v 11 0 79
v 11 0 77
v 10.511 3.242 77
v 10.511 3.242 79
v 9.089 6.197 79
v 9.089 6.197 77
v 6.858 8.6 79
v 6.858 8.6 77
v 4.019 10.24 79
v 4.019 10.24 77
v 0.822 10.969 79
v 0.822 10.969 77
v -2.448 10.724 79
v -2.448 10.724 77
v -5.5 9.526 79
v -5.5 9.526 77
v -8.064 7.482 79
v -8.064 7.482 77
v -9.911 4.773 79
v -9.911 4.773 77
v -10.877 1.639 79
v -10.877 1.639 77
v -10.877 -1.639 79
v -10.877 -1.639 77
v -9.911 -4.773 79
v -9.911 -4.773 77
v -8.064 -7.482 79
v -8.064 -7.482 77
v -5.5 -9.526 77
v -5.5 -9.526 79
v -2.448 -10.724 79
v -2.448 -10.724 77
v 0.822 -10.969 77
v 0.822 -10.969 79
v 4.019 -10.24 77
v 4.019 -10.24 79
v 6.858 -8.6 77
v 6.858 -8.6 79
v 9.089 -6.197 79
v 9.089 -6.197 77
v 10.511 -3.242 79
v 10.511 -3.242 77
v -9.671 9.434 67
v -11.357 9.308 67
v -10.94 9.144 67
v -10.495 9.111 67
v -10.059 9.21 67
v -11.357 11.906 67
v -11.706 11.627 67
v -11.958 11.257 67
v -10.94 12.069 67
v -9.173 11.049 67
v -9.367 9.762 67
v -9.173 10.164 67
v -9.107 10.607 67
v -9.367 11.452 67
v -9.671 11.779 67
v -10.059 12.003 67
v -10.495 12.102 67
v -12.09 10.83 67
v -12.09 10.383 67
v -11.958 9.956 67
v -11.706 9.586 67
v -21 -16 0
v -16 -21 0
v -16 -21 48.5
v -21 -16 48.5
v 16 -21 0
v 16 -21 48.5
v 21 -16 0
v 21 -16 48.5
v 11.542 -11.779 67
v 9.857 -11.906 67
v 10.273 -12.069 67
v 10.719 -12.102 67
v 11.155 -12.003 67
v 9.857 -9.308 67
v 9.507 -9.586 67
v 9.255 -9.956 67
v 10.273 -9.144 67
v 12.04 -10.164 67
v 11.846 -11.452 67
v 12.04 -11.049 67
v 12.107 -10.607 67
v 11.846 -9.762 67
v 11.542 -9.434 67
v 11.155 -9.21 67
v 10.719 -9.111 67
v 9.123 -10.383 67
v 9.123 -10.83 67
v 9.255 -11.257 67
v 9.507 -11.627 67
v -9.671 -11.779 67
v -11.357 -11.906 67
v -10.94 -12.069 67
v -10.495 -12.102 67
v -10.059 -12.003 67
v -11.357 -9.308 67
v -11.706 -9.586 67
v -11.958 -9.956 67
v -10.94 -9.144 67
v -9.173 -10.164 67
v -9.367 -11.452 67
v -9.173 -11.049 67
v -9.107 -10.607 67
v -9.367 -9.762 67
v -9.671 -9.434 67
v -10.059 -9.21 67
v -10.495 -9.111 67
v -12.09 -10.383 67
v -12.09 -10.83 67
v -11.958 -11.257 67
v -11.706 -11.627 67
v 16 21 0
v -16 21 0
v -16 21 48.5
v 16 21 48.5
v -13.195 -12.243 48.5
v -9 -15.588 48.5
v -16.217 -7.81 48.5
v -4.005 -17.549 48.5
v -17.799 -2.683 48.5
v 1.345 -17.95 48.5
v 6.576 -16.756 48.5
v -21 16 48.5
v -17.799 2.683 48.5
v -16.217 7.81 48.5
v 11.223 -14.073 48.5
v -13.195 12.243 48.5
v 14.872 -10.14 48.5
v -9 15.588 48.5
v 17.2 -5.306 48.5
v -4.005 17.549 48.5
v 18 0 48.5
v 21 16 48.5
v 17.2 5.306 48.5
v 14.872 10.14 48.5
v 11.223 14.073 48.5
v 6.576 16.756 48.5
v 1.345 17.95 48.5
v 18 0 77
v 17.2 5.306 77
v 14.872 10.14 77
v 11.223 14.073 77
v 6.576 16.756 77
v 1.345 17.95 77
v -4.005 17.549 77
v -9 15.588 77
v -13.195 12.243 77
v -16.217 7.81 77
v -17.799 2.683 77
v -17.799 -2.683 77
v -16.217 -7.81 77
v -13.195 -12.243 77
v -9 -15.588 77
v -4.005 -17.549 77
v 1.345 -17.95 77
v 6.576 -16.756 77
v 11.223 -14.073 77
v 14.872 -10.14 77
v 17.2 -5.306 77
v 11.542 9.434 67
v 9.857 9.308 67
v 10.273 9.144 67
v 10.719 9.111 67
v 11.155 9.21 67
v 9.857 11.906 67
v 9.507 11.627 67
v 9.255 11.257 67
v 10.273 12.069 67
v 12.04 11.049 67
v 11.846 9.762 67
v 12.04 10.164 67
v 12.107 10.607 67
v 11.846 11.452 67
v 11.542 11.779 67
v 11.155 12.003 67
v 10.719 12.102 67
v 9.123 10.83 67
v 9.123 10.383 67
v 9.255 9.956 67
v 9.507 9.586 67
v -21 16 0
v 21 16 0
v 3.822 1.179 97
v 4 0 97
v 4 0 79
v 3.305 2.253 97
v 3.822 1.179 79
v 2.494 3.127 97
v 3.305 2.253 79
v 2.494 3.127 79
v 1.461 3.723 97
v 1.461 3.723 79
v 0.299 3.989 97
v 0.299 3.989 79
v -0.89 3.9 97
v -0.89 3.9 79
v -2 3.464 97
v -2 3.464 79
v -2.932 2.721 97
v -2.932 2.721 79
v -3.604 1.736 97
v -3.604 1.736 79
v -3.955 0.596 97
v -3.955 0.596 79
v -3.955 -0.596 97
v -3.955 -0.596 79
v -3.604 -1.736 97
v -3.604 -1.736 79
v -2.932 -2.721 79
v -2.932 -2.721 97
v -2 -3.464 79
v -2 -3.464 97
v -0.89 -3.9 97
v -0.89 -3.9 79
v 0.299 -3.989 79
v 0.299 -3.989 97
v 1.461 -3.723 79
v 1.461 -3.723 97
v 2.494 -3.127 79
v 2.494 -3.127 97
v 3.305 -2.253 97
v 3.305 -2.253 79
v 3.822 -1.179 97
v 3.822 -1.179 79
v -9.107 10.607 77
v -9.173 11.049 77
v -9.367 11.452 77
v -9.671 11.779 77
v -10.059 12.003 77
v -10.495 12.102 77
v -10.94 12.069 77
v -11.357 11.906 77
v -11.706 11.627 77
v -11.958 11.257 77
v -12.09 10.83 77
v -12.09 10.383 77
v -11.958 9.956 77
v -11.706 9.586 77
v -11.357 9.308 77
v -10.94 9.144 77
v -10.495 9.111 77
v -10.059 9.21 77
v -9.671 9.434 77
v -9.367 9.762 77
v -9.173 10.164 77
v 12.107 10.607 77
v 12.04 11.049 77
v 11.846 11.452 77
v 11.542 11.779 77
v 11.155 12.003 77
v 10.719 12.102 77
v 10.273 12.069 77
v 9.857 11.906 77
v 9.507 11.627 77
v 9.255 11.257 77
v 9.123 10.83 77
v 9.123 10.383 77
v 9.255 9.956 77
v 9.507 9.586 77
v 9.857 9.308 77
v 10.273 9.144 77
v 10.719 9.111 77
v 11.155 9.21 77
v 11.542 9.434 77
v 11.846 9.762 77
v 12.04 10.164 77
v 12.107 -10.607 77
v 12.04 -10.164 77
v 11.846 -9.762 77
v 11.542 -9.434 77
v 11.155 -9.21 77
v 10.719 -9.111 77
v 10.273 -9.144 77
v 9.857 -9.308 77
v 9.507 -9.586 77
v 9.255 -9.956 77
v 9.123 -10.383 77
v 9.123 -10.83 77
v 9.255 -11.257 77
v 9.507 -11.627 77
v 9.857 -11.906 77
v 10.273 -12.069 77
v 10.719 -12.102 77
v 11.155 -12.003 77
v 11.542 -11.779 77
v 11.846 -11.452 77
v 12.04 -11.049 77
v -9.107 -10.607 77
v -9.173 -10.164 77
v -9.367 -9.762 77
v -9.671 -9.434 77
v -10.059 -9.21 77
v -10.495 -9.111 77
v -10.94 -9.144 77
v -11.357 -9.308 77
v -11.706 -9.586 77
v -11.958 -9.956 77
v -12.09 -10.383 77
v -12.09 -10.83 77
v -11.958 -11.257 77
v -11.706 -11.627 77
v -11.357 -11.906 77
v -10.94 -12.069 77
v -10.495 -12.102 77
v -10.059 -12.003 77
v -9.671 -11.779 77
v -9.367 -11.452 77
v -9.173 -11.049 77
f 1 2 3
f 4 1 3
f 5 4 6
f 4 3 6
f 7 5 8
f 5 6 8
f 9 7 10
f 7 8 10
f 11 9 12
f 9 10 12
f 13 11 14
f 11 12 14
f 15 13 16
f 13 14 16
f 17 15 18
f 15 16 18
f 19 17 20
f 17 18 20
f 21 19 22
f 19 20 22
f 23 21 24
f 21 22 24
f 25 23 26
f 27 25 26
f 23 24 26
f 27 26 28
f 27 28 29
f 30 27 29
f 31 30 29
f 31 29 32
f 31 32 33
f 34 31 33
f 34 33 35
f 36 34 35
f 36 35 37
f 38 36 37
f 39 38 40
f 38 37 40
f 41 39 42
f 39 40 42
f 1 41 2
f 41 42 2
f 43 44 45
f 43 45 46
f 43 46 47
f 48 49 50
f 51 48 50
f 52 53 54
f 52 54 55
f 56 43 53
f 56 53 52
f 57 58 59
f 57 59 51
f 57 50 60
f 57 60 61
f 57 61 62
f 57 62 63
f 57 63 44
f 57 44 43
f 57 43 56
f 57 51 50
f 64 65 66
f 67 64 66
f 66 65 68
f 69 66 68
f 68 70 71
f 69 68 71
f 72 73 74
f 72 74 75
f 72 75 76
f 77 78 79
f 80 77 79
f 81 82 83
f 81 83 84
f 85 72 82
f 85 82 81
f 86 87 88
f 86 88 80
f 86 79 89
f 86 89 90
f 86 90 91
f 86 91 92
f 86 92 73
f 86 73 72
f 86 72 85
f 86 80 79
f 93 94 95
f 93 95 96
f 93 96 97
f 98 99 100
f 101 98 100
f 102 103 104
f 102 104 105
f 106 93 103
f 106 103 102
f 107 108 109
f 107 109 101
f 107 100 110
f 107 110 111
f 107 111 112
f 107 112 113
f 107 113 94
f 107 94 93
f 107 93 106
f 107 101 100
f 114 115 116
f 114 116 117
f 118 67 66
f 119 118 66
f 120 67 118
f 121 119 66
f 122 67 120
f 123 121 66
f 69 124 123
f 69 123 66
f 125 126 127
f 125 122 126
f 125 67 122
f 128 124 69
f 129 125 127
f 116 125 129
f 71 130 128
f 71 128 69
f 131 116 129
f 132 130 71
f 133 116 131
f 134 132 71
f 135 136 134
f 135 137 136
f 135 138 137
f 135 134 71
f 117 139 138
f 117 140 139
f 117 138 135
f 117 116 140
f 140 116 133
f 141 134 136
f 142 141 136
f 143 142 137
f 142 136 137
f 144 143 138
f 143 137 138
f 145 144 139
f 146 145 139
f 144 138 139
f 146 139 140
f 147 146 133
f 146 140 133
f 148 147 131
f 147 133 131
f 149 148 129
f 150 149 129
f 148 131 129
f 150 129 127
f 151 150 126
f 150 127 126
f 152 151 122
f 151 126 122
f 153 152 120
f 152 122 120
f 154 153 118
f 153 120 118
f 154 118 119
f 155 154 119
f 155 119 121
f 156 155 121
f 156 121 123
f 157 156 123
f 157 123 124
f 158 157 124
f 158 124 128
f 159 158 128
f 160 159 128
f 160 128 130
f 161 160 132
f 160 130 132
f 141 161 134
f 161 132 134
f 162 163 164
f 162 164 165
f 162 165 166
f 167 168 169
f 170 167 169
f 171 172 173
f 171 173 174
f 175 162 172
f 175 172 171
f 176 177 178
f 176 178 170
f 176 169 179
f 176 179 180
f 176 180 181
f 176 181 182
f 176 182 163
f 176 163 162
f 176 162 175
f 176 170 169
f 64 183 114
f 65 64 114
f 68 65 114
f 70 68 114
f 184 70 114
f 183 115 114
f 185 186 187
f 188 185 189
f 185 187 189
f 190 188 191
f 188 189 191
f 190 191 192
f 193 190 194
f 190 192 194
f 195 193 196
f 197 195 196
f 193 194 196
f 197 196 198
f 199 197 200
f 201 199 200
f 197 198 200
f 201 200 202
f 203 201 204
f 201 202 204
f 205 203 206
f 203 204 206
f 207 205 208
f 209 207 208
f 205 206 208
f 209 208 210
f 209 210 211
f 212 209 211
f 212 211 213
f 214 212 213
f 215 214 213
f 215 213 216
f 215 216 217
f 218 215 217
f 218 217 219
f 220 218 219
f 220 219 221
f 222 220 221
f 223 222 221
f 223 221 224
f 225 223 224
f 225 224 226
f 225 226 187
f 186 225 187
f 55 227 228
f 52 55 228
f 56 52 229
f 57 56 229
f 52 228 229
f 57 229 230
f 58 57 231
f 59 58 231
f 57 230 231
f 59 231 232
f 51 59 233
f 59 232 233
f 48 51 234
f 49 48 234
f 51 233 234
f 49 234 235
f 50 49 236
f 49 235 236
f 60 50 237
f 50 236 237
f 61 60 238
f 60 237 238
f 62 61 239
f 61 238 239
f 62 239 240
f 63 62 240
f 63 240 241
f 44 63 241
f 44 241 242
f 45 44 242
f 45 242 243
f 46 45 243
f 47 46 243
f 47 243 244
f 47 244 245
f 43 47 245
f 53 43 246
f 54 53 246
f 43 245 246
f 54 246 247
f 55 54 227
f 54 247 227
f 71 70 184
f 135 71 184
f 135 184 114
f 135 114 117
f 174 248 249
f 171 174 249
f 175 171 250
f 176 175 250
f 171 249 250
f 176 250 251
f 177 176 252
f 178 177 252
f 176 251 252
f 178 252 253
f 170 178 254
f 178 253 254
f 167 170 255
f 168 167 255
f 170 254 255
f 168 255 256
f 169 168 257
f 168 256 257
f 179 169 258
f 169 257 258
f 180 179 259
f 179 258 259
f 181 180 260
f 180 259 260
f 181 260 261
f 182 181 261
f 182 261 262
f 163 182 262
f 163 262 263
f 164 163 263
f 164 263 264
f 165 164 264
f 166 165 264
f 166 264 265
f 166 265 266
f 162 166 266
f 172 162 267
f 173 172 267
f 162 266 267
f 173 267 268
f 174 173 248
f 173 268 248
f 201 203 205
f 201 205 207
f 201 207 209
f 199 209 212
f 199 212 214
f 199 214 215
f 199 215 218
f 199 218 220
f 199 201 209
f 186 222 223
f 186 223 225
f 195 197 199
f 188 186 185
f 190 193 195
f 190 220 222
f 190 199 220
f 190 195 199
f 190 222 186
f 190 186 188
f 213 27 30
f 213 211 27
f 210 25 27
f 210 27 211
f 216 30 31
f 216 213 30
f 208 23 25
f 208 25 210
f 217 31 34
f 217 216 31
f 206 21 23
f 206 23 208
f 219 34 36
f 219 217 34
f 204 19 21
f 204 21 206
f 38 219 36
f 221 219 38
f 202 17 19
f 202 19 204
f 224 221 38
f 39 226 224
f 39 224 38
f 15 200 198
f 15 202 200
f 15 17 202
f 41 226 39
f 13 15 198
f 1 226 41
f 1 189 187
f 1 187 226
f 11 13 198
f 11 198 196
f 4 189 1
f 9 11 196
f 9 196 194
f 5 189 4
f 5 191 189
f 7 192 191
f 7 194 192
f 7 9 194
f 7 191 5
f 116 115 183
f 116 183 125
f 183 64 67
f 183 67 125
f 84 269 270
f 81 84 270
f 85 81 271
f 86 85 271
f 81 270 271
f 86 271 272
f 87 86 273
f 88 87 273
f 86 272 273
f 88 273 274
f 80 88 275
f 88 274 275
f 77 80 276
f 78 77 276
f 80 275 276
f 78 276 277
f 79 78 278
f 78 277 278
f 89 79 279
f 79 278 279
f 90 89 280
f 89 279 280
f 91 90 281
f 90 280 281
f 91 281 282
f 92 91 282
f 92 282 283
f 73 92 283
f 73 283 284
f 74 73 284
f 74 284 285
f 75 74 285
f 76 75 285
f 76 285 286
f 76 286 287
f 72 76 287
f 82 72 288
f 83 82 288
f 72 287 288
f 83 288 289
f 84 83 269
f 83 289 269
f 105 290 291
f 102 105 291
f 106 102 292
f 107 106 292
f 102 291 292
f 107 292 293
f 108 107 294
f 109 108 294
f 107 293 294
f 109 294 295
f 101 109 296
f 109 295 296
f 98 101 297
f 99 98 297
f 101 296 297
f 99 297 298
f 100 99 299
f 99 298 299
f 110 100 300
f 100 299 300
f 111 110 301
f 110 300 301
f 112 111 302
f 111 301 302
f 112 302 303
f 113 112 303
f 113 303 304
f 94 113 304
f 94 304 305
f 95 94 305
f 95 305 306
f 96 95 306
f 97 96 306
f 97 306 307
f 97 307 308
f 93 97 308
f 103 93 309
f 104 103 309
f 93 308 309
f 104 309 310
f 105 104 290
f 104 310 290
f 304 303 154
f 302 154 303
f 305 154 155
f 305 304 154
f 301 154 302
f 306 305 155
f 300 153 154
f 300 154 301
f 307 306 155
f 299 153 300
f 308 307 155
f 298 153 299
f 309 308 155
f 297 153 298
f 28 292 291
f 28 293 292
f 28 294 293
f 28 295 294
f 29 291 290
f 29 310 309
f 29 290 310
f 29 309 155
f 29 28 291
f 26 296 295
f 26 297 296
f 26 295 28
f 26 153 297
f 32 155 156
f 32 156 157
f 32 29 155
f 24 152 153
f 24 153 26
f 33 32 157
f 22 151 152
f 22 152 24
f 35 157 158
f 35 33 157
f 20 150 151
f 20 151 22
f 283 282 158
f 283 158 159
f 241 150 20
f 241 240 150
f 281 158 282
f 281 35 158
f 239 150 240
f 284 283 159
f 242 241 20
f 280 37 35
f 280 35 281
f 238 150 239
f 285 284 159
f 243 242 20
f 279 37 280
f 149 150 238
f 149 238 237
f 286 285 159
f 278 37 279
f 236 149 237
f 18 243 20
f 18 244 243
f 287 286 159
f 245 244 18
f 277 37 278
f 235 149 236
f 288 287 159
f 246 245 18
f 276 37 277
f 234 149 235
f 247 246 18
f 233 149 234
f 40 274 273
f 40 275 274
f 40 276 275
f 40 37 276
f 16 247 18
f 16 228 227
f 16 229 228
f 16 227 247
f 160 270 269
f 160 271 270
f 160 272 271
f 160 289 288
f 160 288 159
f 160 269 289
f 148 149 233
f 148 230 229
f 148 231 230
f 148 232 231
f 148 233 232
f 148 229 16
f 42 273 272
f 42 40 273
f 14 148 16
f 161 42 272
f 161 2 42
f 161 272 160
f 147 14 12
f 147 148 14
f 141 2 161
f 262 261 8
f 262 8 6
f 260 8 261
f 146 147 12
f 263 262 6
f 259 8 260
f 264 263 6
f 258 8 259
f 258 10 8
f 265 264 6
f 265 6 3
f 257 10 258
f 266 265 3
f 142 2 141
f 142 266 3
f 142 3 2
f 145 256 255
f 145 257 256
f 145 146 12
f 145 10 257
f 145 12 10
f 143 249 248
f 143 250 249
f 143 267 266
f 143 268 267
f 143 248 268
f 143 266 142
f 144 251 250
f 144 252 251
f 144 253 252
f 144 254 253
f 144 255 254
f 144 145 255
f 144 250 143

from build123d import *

# Parameters (mm, degrees)
SKETCH1_W           = 42
SKETCH1_H           = 42
BOSS_EXTRUDE1_DEPTH = 48.5
SKETCH2_R           = 18
BOSS_EXTRUDE2_DEPTH = 28.5
SKETCH3_R           = 11
SKETCH3_R_2         = 4
BOSS_EXTRUDE3_DEPTH = 2
SKETCH3_2_R         = 4
BOSS_EXTRUDE4_DEPTH = 20
SKETCH4_R           = 1.5
CUT_EXTRUDE1_DEPTH  = 10
CHAMFER1_SIZE       = 5


with BuildPart() as part:
    # Sketch1 → Boss-Extrude1 (new body)
    with BuildSketch(Plane.XY):
        Rectangle(SKETCH1_W, SKETCH1_H)
    extrude(amount=BOSS_EXTRUDE1_DEPTH)

    # Sketch2 → Boss-Extrude2 (add)
    with BuildSketch(Plane.XY.offset(48.5)):
        Circle(SKETCH2_R)
    extrude(amount=BOSS_EXTRUDE2_DEPTH)

    # Sketch3 → Boss-Extrude3 (add)
    with BuildSketch(Plane.XY.offset(77)):
        Circle(SKETCH3_R)
        Circle(SKETCH3_R_2, mode=Mode.SUBTRACT)
    extrude(amount=BOSS_EXTRUDE3_DEPTH)

    # Sketch3<2> → Boss-Extrude4 (add)
    with BuildSketch(Plane.XY.offset(77)):
        Circle(SKETCH3_2_R)
    extrude(amount=BOSS_EXTRUDE4_DEPTH)

    # Sketch4 → Cut-Extrude1 (cut)
    with BuildSketch(Plane.XY.offset(77)):
        with Locations((10.606601718, -10.606601718)):
            Circle(SKETCH4_R)
        with Locations((-10.606601718, -10.606601718)):
            Circle(SKETCH4_R)
        with Locations((-10.606601718, 10.606601718)):
            Circle(SKETCH4_R)
        with Locations((10.606601718, 10.606601718)):
            Circle(SKETCH4_R)
    extrude(amount=-CUT_EXTRUDE1_DEPTH, mode=Mode.SUBTRACT)

    # Chamfer1
    chamfer1_edges = [part.edges().sort_by_distance(p)[0] for p in [
        (21, -21, 24.25),
        (-21, -21, 24.25),
        (-21, 21, 24.25),
        (21, 21, 24.25),
    ]]
    chamfer(chamfer1_edges, length=CHAMFER1_SIZE)


solid = part.part
